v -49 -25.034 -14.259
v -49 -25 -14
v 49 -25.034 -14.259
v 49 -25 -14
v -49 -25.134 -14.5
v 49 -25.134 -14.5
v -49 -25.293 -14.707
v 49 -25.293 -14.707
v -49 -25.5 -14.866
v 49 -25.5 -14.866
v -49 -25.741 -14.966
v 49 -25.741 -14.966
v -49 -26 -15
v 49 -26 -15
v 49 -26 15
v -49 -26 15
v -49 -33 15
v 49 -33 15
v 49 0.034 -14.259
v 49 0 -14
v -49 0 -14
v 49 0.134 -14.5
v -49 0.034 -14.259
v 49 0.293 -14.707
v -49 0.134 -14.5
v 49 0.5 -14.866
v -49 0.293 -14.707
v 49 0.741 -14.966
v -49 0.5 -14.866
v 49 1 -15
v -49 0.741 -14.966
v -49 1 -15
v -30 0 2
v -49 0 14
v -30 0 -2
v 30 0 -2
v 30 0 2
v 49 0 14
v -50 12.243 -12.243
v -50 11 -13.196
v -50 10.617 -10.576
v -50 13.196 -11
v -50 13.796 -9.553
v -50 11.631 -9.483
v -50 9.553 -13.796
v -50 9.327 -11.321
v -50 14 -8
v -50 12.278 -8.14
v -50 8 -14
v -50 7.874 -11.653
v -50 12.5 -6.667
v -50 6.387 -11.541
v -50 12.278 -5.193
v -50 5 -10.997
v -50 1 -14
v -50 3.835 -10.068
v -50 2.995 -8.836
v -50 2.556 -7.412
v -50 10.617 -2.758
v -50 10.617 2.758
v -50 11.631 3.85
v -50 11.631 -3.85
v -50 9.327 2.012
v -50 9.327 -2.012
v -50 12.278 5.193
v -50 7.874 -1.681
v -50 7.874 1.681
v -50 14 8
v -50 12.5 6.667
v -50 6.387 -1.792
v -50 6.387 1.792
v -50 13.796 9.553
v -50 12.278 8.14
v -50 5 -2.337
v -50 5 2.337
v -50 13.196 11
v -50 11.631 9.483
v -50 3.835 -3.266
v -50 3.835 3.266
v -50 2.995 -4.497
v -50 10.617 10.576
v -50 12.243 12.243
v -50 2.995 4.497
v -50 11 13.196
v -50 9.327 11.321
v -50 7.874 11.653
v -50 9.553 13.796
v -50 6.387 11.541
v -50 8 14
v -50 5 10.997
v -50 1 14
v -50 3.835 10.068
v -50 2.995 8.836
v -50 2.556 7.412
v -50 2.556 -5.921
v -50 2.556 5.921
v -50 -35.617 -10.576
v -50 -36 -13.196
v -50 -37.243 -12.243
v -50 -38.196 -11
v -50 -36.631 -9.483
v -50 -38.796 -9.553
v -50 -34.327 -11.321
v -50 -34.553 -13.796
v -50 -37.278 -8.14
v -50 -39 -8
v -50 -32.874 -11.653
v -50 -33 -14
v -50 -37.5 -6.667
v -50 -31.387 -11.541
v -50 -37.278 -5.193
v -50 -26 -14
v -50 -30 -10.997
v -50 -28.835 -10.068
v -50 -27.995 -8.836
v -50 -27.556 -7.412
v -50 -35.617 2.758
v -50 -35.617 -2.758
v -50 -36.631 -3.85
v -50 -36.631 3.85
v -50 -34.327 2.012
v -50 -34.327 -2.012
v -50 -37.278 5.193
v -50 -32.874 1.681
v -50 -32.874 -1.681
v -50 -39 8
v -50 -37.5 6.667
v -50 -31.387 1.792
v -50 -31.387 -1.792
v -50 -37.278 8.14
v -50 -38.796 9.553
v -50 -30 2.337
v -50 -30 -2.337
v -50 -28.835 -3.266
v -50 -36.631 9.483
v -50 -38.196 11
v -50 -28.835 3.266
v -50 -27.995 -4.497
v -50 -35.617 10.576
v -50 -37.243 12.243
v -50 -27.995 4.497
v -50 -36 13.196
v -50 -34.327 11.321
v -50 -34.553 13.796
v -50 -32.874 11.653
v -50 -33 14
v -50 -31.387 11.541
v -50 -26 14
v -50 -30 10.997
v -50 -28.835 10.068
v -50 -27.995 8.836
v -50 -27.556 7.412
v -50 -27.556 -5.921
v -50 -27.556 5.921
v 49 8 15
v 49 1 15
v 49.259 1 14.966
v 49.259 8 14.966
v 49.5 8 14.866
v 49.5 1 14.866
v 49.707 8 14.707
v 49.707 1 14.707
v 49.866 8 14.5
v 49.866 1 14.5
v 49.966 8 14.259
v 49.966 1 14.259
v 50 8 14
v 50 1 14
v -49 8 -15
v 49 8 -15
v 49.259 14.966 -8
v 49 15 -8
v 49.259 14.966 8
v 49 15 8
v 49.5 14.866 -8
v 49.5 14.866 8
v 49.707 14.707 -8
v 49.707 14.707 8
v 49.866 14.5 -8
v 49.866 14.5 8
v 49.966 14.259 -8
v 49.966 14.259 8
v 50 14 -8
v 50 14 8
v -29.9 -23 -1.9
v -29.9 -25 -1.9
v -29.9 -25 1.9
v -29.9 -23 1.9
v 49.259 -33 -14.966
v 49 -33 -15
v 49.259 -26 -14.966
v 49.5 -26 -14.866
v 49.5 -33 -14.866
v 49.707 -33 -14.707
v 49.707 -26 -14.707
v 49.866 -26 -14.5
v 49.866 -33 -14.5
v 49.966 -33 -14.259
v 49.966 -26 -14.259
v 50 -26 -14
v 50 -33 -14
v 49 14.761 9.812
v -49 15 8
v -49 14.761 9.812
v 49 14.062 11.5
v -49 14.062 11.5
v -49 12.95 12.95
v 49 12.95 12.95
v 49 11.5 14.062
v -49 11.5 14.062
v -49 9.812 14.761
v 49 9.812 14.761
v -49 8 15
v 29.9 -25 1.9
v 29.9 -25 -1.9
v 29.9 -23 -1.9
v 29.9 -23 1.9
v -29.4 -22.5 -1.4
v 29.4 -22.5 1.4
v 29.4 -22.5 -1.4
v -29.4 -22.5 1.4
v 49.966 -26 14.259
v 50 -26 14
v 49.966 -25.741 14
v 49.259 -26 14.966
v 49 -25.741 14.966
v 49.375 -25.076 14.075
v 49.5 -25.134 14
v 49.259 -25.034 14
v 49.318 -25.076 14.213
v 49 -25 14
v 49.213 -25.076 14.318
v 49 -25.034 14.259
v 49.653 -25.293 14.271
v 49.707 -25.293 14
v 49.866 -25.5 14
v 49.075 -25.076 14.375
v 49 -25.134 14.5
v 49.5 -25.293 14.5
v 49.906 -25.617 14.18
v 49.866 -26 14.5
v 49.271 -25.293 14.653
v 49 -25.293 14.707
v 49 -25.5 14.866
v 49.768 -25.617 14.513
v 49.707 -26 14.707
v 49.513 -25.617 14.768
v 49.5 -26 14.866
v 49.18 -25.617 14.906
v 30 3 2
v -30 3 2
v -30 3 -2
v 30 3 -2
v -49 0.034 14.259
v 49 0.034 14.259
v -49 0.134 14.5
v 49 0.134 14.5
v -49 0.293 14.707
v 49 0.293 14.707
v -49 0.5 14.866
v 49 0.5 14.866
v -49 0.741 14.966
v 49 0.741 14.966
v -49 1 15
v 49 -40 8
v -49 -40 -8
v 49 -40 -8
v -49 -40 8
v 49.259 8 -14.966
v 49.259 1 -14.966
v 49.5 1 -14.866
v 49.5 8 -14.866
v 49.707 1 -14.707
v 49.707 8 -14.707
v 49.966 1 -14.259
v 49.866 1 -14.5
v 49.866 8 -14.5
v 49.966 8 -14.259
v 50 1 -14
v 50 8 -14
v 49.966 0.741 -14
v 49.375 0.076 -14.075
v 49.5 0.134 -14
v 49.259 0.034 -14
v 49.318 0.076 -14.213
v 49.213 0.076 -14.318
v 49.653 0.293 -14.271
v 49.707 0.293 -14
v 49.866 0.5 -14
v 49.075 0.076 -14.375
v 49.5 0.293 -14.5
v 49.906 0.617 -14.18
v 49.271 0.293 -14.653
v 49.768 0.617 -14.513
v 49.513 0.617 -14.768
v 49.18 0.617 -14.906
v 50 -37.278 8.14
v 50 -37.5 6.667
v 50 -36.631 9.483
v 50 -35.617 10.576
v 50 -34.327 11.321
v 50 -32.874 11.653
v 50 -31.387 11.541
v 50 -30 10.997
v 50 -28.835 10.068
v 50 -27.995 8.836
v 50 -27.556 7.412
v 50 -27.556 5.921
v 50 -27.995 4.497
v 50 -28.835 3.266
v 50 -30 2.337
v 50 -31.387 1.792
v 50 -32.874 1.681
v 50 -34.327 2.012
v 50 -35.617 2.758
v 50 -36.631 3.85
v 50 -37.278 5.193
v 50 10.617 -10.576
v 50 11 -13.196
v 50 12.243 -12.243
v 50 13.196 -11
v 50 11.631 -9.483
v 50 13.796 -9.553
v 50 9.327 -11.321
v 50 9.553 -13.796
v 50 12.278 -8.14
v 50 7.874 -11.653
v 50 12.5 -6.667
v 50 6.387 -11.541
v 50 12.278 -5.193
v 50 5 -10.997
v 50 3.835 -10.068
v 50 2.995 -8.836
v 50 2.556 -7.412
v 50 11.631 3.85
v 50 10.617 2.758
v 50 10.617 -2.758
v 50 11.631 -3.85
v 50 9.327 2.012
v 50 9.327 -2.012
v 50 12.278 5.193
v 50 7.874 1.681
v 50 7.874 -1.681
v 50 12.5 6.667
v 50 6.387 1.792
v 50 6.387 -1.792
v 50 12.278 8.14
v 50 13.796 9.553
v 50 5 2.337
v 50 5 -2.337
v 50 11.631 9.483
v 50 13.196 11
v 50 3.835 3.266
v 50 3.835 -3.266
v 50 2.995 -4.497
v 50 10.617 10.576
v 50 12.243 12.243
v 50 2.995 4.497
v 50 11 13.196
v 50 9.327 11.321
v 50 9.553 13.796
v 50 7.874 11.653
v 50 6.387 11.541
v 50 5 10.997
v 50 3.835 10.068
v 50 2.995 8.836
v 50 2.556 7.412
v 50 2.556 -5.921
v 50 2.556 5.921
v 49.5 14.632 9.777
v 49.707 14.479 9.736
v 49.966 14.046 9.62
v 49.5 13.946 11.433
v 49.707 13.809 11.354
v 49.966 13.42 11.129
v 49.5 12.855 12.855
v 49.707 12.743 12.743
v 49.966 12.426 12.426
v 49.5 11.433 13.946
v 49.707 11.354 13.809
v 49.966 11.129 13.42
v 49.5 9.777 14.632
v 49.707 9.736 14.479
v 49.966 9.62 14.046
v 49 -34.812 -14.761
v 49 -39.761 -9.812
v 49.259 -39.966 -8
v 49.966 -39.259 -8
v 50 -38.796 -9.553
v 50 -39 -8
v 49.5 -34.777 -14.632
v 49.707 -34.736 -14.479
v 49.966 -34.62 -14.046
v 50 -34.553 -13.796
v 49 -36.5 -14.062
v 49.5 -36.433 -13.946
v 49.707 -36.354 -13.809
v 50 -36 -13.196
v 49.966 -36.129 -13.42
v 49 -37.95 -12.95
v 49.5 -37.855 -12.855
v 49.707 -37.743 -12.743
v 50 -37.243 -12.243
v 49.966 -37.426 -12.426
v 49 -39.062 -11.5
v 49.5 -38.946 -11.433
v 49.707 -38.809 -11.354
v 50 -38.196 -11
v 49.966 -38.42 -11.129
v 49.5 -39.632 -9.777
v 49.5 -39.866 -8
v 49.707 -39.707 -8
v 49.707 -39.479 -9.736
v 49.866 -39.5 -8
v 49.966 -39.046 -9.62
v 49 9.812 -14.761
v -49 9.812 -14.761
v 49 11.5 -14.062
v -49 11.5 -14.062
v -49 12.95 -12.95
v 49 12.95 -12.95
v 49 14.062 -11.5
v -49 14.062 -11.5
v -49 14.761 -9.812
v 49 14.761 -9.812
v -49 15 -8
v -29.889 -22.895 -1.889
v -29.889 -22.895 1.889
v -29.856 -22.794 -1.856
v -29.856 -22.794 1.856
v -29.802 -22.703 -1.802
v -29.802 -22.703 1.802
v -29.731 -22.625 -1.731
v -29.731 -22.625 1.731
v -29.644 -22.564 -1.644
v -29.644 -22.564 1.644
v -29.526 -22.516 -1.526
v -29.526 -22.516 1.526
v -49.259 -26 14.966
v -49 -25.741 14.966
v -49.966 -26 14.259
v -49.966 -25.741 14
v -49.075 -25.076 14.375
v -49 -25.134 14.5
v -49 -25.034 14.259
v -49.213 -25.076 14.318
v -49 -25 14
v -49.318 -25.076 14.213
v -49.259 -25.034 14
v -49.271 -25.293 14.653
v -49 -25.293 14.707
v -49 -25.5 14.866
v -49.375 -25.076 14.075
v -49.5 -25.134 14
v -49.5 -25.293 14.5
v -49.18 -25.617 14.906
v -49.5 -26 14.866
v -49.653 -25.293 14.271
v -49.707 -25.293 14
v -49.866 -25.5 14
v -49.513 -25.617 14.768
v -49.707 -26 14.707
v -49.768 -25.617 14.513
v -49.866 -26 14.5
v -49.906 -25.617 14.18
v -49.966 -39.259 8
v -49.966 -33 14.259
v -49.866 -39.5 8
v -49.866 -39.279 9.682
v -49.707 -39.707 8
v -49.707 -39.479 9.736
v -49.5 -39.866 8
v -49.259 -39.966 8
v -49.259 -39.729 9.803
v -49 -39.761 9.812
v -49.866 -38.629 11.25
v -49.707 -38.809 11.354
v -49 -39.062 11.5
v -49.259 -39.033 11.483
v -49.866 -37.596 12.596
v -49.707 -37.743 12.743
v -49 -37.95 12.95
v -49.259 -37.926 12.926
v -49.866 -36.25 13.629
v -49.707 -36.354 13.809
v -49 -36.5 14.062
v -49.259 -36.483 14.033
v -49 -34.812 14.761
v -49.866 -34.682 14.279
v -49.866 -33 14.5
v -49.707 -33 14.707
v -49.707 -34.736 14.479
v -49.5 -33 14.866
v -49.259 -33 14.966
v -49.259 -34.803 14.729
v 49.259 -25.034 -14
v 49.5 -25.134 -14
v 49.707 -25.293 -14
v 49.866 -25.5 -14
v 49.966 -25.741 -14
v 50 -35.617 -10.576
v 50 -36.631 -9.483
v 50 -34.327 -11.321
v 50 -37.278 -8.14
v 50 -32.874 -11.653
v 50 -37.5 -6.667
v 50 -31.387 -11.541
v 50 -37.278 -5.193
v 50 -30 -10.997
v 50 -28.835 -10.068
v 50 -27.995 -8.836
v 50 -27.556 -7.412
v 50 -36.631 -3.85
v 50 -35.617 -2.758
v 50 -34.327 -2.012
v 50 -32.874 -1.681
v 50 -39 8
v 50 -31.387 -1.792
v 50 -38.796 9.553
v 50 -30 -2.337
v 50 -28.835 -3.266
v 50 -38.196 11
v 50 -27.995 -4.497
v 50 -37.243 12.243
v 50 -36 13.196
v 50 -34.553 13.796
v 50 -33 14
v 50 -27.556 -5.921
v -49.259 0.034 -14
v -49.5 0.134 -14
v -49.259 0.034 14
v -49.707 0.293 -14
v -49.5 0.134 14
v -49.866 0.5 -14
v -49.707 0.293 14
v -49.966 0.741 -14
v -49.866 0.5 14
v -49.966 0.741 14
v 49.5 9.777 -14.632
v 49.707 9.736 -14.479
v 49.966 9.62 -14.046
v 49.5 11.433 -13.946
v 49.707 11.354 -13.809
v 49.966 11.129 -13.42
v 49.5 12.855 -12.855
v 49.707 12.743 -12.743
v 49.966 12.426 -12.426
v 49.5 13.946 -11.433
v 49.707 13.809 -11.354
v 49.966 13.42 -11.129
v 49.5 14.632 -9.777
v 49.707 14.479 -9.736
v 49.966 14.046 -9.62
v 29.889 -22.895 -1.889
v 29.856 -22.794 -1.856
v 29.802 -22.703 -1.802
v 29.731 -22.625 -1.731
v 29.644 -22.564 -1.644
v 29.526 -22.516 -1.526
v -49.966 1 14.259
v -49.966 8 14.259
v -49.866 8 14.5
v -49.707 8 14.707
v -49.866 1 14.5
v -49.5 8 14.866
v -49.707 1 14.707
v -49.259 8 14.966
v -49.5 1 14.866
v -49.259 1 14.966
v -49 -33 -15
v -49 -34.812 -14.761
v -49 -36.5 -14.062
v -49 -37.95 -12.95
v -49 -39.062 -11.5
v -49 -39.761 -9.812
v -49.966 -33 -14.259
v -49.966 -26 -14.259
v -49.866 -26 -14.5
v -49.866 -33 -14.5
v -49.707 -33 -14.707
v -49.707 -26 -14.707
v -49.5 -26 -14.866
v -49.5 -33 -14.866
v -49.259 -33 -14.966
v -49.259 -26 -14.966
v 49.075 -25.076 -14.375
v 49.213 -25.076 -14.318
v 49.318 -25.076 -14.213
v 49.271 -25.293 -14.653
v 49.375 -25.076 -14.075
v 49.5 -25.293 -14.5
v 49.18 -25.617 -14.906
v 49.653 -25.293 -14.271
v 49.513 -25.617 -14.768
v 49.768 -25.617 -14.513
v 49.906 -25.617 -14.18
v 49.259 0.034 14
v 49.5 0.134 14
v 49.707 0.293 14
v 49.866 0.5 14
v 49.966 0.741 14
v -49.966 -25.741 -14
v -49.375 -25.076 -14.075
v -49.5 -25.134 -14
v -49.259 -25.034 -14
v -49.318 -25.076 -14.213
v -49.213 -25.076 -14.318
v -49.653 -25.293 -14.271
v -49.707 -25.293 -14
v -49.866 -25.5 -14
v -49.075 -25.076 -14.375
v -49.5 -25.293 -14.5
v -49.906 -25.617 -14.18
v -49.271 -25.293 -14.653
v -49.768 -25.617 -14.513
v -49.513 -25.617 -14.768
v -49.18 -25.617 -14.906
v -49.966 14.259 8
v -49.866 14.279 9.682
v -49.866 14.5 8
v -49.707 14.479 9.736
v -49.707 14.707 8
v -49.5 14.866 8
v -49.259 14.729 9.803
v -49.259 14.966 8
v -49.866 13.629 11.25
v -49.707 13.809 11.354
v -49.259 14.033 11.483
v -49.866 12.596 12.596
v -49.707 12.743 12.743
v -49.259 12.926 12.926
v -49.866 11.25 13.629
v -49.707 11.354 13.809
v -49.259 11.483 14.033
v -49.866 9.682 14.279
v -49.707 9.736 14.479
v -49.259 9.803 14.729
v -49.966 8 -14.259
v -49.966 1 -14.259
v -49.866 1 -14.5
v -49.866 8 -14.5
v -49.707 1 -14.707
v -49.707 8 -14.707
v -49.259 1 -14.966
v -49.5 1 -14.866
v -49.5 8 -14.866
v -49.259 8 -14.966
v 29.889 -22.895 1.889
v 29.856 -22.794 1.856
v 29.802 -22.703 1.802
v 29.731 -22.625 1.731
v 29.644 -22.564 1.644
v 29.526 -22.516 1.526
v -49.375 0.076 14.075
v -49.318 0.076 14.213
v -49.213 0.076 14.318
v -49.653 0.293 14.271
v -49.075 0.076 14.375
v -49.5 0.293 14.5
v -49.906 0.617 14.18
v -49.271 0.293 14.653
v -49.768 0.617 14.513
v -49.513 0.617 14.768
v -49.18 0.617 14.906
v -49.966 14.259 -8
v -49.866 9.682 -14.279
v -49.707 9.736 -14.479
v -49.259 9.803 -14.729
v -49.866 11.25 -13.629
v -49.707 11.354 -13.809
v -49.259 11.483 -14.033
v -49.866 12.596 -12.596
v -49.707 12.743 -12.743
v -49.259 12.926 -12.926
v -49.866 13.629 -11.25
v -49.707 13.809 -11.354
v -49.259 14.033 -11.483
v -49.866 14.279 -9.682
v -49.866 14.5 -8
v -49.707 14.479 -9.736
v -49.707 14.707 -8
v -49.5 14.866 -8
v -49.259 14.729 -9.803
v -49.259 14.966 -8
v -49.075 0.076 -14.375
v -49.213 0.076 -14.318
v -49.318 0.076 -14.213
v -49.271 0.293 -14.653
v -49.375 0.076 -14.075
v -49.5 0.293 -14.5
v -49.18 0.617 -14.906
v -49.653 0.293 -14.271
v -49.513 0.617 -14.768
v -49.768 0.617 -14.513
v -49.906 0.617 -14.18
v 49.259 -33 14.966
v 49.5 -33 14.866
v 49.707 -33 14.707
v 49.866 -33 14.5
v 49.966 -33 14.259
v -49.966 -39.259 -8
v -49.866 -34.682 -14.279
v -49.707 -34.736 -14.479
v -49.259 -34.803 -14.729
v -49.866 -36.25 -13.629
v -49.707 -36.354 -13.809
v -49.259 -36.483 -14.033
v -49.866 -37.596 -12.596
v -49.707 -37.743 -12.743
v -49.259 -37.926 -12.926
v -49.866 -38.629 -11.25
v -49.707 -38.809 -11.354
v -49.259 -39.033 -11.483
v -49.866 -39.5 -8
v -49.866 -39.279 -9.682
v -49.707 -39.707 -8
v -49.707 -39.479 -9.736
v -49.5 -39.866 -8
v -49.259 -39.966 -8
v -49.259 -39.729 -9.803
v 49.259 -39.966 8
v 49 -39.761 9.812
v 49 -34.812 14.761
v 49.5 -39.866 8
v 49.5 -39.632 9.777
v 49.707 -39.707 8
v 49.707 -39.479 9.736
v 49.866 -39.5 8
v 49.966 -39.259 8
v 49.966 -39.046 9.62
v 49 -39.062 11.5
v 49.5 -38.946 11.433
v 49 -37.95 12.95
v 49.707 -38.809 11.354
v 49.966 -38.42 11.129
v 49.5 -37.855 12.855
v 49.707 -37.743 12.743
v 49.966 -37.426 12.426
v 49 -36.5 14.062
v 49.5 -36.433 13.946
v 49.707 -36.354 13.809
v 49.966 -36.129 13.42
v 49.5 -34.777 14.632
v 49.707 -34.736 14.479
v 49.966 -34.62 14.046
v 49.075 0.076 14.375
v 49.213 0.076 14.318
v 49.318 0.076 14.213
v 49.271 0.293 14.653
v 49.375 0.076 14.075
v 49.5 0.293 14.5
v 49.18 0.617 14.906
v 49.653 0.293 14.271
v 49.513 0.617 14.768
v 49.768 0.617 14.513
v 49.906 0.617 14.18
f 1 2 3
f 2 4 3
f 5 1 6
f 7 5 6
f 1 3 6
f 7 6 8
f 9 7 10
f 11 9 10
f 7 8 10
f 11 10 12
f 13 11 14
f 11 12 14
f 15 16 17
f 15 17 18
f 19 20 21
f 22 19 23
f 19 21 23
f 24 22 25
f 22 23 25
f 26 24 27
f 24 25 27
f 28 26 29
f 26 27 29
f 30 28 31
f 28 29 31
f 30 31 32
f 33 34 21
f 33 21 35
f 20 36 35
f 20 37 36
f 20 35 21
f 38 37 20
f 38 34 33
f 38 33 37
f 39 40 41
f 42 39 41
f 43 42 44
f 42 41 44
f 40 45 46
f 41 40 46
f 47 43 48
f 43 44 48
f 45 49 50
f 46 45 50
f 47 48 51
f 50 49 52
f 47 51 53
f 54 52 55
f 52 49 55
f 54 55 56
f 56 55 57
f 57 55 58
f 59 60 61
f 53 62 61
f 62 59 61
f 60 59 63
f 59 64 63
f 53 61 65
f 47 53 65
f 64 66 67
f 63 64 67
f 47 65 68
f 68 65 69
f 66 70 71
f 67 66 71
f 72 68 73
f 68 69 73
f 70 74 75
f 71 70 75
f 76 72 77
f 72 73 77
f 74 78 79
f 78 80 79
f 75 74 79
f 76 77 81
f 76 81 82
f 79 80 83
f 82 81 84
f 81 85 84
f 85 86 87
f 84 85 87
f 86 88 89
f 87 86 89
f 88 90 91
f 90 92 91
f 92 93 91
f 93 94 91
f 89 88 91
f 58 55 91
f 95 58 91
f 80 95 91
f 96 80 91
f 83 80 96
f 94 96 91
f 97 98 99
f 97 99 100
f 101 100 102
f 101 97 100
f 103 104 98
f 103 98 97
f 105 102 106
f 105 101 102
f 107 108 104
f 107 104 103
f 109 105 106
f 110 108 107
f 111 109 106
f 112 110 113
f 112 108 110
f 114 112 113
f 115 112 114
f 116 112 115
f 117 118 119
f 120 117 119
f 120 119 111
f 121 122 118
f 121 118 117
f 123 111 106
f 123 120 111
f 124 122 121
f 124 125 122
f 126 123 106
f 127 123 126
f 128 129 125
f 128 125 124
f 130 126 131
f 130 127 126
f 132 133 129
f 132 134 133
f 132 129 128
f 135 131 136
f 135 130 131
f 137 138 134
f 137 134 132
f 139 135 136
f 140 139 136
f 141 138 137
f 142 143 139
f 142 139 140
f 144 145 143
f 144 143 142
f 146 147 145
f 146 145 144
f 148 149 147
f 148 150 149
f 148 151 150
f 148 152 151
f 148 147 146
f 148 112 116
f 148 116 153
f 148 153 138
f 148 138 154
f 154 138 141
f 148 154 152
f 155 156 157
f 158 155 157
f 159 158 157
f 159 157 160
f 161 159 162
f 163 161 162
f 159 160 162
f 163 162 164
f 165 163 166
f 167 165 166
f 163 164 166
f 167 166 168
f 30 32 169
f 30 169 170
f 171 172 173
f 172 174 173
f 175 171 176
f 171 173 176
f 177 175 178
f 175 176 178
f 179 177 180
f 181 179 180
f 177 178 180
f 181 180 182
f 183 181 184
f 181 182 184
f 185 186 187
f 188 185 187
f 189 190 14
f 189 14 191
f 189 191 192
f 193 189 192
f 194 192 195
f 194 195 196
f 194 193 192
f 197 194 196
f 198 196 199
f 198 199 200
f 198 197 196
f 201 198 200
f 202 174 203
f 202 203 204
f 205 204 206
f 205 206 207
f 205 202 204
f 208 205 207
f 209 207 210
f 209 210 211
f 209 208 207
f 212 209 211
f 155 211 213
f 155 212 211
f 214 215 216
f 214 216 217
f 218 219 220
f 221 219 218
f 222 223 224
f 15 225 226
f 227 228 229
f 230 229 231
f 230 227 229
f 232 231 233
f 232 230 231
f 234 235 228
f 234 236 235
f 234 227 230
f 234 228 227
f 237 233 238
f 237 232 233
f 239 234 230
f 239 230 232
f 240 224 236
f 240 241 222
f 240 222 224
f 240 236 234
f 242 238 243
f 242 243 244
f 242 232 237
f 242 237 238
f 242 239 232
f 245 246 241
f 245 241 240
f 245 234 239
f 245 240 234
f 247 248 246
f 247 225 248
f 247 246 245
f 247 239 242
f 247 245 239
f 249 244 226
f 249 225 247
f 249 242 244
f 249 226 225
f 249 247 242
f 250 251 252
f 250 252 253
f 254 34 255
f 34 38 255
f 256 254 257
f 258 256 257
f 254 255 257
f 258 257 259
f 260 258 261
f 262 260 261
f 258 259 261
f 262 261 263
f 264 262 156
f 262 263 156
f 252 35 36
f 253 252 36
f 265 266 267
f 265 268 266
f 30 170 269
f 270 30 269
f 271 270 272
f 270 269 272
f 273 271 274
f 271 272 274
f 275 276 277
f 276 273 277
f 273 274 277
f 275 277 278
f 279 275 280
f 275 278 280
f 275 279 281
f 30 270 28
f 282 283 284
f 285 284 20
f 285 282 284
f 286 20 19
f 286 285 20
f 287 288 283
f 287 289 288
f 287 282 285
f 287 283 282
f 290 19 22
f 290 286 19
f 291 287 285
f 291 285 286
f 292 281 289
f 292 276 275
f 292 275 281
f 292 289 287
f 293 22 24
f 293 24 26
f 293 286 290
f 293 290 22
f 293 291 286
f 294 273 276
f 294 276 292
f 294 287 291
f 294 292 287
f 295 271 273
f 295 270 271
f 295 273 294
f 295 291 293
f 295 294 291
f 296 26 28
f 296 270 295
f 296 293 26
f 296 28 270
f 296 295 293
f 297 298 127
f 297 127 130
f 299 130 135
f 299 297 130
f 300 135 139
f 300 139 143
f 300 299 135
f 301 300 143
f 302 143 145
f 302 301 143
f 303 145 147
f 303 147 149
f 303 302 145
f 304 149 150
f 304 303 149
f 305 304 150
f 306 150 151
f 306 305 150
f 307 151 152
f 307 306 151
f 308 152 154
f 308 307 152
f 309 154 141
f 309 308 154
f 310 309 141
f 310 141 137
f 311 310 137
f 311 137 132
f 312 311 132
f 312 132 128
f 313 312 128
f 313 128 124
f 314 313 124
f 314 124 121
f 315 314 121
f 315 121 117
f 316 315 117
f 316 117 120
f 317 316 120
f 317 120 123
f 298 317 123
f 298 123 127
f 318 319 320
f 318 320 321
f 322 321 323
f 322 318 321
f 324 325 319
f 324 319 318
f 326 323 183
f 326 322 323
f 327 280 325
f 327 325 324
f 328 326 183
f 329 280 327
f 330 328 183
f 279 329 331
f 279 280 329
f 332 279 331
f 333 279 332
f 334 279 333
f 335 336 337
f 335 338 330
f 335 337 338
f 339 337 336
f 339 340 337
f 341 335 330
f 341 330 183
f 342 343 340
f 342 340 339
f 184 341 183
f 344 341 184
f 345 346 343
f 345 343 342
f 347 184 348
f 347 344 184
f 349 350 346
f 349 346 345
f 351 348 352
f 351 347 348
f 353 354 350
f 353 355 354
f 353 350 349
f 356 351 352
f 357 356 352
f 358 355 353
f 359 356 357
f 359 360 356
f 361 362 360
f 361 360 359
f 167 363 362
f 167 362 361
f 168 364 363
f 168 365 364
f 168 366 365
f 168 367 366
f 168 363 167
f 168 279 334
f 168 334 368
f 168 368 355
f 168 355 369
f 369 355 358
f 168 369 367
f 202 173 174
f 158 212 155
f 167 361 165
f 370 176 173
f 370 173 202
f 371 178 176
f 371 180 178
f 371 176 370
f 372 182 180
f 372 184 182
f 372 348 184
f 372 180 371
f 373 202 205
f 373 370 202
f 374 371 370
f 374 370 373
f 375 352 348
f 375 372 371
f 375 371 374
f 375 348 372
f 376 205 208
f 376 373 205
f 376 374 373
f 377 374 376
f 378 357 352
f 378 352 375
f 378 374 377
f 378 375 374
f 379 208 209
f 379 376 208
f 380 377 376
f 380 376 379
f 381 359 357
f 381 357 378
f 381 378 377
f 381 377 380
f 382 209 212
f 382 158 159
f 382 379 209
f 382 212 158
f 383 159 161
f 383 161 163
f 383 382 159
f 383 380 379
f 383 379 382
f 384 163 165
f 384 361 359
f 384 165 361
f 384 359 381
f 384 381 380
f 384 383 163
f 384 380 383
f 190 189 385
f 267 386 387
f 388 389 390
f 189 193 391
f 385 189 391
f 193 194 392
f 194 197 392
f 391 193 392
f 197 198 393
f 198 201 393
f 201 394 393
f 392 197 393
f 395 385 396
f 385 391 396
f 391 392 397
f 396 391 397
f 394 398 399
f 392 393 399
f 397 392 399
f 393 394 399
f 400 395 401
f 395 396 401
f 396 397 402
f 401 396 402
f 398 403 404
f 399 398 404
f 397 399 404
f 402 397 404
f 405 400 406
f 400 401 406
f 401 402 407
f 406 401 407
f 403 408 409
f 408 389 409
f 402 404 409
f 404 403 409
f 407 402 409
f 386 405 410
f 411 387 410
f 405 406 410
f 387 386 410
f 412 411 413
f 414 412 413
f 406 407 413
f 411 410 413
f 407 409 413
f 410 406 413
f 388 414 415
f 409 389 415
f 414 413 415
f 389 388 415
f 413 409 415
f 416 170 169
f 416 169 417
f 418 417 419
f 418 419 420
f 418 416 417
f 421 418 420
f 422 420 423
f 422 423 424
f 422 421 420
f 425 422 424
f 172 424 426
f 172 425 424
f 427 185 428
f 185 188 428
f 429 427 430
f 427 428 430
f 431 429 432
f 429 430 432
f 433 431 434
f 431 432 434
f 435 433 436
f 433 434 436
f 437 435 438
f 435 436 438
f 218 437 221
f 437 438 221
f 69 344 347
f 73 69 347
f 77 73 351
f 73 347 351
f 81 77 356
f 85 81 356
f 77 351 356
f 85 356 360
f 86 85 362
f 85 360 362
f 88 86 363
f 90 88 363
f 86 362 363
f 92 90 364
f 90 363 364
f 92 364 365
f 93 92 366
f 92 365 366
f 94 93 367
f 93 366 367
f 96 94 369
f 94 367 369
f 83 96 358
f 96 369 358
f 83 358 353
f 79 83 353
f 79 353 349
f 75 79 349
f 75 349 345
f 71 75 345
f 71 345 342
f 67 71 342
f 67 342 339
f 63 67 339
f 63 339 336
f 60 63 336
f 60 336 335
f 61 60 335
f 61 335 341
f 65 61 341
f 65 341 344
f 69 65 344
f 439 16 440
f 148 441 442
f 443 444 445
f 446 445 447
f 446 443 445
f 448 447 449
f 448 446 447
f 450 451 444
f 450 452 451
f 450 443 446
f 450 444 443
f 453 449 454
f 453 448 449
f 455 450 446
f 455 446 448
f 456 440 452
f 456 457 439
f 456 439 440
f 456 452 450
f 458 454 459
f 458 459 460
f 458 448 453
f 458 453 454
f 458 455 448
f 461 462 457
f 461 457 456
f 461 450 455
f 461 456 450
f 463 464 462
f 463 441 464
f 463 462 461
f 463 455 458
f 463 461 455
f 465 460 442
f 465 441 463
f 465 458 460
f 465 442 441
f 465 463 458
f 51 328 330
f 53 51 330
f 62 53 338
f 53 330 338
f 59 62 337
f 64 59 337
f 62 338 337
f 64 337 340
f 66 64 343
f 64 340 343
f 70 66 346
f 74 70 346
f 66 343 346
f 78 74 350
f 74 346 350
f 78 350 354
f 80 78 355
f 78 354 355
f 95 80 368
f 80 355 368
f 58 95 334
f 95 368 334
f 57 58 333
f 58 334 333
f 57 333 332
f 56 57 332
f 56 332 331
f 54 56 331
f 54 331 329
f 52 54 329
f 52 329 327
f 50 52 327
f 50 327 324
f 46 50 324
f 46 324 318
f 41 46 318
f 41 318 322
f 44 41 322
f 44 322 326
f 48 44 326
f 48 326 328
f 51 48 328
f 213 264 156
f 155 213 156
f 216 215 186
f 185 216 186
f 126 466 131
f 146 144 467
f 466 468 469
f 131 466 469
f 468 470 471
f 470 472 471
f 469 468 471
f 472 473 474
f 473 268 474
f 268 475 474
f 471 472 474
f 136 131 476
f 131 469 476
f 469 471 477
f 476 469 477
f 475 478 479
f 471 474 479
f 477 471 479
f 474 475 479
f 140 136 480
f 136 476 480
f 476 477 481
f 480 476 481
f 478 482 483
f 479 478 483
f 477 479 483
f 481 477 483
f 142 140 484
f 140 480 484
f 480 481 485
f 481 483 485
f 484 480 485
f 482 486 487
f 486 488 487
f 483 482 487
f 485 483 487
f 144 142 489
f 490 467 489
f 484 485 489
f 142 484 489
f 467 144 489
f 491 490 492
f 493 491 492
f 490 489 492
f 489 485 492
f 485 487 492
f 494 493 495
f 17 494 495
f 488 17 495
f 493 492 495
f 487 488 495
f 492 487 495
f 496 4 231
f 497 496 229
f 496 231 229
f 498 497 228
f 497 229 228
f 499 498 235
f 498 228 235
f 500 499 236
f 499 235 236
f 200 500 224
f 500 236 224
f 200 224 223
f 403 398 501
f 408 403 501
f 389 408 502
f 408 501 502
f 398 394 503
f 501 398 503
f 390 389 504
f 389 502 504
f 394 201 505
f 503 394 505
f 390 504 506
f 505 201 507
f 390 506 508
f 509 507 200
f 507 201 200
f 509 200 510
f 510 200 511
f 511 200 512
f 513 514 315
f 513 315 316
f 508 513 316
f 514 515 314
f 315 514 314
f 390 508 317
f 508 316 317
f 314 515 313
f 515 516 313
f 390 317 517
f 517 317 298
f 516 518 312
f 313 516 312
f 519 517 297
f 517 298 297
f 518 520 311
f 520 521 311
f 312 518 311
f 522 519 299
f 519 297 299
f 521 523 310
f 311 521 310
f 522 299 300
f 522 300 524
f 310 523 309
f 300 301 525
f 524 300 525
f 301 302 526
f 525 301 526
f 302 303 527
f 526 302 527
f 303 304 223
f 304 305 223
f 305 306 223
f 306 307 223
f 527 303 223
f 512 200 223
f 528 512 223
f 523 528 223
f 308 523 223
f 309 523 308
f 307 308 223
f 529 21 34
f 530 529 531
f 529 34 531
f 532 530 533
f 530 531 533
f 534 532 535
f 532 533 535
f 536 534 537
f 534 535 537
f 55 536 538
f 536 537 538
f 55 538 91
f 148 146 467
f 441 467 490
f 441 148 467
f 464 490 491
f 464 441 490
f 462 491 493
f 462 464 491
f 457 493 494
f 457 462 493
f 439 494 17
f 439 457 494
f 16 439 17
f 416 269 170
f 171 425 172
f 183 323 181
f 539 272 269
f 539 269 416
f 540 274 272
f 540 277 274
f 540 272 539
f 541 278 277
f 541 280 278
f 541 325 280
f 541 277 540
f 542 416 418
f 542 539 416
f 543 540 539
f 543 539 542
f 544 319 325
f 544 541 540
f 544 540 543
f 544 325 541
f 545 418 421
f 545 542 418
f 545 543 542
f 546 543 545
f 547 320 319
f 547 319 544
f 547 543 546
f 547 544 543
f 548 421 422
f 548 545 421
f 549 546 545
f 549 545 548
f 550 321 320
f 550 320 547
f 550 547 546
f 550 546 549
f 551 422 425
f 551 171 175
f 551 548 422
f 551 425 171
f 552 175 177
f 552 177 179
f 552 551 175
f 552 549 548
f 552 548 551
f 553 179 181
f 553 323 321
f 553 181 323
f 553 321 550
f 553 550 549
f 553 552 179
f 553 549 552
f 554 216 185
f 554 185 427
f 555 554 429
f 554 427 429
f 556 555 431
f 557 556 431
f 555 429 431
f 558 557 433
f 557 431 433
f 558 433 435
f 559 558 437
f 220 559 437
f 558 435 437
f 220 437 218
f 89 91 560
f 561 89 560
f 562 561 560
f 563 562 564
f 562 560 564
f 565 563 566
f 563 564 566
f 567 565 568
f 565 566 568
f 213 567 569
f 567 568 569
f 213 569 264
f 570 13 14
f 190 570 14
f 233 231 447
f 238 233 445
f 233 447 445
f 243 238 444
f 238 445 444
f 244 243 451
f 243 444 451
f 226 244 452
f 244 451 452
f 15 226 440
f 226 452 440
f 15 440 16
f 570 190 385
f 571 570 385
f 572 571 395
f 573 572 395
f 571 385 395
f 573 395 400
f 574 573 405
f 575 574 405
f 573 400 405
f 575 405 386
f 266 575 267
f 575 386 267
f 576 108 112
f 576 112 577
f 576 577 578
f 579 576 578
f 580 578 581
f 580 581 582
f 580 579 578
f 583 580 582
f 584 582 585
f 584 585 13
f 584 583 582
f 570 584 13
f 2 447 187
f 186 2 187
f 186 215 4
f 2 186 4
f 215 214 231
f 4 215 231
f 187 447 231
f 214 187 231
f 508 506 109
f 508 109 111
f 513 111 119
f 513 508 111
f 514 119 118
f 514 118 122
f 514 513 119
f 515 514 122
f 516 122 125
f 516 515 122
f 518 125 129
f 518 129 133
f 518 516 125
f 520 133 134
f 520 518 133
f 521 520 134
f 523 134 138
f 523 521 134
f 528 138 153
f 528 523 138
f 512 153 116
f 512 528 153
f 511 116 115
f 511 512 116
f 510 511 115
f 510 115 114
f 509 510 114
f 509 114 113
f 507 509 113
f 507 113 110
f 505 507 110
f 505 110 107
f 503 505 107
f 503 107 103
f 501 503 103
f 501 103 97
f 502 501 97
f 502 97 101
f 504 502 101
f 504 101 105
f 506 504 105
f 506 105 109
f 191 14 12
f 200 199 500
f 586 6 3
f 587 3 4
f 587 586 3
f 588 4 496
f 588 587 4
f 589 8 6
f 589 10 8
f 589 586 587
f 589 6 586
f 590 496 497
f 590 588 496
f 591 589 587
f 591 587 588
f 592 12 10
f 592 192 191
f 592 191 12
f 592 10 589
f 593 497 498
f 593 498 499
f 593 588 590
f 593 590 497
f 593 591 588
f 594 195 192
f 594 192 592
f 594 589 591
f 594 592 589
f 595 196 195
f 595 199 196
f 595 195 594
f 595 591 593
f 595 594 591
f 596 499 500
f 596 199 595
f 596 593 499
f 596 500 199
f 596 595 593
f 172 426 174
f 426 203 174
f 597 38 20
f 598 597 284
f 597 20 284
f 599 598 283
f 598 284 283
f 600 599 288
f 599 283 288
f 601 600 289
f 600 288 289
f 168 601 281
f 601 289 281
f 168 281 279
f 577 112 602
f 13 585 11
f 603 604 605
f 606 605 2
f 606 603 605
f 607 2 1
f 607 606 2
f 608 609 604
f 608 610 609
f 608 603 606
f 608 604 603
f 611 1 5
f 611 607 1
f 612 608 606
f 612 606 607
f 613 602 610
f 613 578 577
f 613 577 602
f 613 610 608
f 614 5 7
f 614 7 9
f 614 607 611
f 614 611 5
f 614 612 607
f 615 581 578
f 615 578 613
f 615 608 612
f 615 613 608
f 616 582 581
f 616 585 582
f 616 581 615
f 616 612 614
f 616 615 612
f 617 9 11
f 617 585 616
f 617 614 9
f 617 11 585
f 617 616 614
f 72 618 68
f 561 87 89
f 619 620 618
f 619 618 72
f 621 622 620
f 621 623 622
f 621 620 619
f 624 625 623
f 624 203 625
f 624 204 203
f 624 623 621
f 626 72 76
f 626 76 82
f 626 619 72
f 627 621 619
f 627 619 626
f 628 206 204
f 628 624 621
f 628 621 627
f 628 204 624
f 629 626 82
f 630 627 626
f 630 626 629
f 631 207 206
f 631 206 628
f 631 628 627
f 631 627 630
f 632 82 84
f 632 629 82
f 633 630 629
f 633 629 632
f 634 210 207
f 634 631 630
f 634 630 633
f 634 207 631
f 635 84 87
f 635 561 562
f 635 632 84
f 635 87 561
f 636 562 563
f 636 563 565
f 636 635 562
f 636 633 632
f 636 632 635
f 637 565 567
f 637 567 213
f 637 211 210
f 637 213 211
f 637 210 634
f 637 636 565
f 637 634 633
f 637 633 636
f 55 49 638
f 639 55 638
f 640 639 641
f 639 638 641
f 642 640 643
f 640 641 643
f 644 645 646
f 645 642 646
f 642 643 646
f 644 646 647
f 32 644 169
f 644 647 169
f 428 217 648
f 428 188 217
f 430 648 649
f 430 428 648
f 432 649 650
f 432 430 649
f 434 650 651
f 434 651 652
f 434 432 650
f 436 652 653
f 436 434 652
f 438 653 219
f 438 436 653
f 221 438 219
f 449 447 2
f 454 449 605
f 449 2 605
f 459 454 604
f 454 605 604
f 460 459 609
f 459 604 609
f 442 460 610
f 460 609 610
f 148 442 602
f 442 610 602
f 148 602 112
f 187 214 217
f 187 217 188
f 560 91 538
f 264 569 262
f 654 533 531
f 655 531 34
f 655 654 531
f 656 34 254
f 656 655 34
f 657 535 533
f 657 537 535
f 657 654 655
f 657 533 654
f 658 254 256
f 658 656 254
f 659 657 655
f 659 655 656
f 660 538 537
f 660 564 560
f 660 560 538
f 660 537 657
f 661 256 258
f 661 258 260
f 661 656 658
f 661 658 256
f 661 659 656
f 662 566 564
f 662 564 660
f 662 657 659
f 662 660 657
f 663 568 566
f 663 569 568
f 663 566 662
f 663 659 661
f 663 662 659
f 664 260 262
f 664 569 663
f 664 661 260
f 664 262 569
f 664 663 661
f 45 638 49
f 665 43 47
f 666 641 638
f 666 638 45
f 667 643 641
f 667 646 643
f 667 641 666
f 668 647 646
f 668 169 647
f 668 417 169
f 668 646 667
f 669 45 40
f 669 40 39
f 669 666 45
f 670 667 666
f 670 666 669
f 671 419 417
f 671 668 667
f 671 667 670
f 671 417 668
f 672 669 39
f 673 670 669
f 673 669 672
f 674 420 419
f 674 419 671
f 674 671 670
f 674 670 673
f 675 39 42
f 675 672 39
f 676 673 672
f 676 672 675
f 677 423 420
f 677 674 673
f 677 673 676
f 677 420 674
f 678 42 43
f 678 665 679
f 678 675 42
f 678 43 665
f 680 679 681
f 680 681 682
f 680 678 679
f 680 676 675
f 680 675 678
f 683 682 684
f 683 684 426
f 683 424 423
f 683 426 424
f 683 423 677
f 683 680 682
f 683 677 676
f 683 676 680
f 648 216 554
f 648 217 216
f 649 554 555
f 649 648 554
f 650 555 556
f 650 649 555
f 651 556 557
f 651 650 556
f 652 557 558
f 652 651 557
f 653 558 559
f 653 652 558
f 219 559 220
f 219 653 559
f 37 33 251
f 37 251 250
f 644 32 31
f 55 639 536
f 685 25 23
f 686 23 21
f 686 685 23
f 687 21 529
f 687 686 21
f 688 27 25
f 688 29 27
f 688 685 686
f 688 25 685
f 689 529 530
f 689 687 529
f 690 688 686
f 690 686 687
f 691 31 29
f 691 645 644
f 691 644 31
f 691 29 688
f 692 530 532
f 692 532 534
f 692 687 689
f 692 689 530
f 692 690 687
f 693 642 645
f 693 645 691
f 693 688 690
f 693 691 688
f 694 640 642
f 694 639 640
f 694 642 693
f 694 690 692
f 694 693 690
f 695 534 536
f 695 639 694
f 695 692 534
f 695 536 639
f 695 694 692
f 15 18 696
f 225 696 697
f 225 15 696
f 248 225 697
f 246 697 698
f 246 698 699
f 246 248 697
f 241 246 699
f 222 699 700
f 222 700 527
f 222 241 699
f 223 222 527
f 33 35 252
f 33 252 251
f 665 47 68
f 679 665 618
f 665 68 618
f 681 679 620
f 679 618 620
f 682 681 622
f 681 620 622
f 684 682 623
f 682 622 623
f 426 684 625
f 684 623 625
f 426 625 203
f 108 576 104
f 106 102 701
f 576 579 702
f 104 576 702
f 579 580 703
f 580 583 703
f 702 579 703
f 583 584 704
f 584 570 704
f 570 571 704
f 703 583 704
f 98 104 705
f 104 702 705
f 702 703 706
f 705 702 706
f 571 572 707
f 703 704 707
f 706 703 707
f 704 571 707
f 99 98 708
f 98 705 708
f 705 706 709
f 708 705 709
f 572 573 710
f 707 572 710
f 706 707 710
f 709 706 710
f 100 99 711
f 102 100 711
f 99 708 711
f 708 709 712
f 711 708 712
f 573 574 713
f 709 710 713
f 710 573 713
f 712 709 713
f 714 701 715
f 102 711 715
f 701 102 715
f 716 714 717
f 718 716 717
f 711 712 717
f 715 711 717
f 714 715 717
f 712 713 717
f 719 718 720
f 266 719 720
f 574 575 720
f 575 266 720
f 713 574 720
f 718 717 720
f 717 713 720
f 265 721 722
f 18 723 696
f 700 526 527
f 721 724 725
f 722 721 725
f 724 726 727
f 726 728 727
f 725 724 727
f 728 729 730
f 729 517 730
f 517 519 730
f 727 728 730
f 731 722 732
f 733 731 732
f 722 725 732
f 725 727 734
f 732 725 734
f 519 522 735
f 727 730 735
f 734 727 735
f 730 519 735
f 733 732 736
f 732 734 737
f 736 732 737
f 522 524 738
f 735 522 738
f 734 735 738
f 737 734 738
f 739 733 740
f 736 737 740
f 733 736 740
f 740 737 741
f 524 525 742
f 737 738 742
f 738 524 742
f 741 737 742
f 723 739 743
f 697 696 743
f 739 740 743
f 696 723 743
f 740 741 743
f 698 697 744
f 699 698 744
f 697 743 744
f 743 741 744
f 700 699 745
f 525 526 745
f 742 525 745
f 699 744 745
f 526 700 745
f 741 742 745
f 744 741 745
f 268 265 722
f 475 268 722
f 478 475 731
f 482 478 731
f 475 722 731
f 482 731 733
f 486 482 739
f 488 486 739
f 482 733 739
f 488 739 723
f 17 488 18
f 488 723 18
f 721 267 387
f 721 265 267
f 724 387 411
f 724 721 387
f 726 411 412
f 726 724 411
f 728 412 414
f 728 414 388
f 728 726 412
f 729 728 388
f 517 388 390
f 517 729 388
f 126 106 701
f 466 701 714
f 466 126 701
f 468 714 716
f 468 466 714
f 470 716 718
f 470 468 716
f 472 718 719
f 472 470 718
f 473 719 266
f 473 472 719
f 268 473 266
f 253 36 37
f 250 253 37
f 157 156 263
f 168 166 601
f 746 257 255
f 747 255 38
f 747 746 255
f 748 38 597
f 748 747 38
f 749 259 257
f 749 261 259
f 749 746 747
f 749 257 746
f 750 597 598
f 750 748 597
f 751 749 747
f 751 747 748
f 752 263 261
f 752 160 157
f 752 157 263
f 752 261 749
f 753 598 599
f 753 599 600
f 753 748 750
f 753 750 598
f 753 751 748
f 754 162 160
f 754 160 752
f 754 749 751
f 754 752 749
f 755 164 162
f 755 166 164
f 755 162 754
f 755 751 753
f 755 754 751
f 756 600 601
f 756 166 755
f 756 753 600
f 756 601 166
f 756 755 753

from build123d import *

# Parameters (mm, degrees)
F0_W      = 100
F0_H      = 30
F1_DEPTH  = 15
F2_R      = 5
F3_DEPTH  = 100.001
F5_R      = 7
F5_2_R    = 7
F6_R      = 1
F6_2_R    = 1
F8_W      = 60
F8_H      = 4
F9_DEPTH  = 3
F10_W     = 59.8
F10_H     = 3.8
F11_DEPTH = 2.5
F12_R     = 0.5
F13_R     = 1
F14_R     = 1


with BuildPart() as f1:
    # F0 (on Front) → F1 (new body)
    with BuildSketch(Plane.XZ):
        Rectangle(F0_W, F0_H)
    extrude(amount=-F1_DEPTH)

    # F2 (on face) → F3 (cut, through all)
    with BuildSketch(Plane.YZ.offset(50)):
        with Locations((7.5, 6.6666666667)):
            Circle(F2_R)
        with Locations((7.5, -6.6666666667)):
            Circle(F2_R)
    extrude(amount=-F3_DEPTH, mode=Mode.SUBTRACT)


with BuildPart() as f4_1:
    # F4: instance of F1
    add(f1.part.mirror(Plane.XZ))

    # F5
    f5_edges = [f4_1.edges().sort_by_distance(p)[0] for p in [
        (0, -15, 15),
        (0, -15, -15),
    ]]
    fillet(f5_edges, radius=F5_R)

    # F6#2
    f6_2_edges = [f4_1.edges().sort_by_distance(p)[0] for p in [
        (-50, -15, 0),
        (50, -15, 0),
    ]]
    fillet(f6_2_edges, radius=F6_2_R)


with BuildPart() as f1_1:
    add(f1.part)

    # F5#2
    f5_2_edges = [f1_1.edges().sort_by_distance(p)[0] for p in [
        (0, 15, 15),
        (0, 15, -15),
    ]]
    fillet(f5_2_edges, radius=F5_2_R)

    # F6
    f6_edges = [f1_1.edges().sort_by_distance(p)[0] for p in [
        (-50, 15, 0),
        (50, 15, 0),
    ]]
    fillet(f6_edges, radius=F6_R)

    # F8 (on face) → F9 (cut)
    with BuildSketch(Plane.XZ):
        Rectangle(F8_W, F8_H)
    extrude(amount=-F9_DEPTH, mode=Mode.SUBTRACT)

    # F14
    f14_edges = [f1_1.edges().sort_by_distance(p)[0] for p in [
        (0, 0, 15),
    ]]
    fillet(f14_edges, radius=F14_R)


with BuildPart() as f4_1_1:
    # F7: moved
    add(f4_1.part.moved(Location((0, -25, 0))))

    # F10 (on face) → F11 (join)
    with BuildSketch(Plane(origin=(0, -25, 0), x_dir=(-1, 0, 0), z_dir=(0, 1, 0))):
        Rectangle(F10_W, F10_H)
    extrude(amount=F11_DEPTH)

    # F12
    f12_edges = [f4_1_1.edges().sort_by_distance(p)[0] for p in [
        (0, -22.5, -1.9),
        (29.9, -22.5, 0),
        (0, -22.5, 1.9),
        (-29.9, -22.5, 0),
    ]]
    fillet(f12_edges, radius=F12_R)

    # F13
    f13_edges = [f4_1_1.edges().sort_by_distance(p)[0] for p in [
        (0, -25, -15),
    ]]
    fillet(f13_edges, radius=F13_R)


solid = Compound([f1_1.part, f4_1_1.part])
